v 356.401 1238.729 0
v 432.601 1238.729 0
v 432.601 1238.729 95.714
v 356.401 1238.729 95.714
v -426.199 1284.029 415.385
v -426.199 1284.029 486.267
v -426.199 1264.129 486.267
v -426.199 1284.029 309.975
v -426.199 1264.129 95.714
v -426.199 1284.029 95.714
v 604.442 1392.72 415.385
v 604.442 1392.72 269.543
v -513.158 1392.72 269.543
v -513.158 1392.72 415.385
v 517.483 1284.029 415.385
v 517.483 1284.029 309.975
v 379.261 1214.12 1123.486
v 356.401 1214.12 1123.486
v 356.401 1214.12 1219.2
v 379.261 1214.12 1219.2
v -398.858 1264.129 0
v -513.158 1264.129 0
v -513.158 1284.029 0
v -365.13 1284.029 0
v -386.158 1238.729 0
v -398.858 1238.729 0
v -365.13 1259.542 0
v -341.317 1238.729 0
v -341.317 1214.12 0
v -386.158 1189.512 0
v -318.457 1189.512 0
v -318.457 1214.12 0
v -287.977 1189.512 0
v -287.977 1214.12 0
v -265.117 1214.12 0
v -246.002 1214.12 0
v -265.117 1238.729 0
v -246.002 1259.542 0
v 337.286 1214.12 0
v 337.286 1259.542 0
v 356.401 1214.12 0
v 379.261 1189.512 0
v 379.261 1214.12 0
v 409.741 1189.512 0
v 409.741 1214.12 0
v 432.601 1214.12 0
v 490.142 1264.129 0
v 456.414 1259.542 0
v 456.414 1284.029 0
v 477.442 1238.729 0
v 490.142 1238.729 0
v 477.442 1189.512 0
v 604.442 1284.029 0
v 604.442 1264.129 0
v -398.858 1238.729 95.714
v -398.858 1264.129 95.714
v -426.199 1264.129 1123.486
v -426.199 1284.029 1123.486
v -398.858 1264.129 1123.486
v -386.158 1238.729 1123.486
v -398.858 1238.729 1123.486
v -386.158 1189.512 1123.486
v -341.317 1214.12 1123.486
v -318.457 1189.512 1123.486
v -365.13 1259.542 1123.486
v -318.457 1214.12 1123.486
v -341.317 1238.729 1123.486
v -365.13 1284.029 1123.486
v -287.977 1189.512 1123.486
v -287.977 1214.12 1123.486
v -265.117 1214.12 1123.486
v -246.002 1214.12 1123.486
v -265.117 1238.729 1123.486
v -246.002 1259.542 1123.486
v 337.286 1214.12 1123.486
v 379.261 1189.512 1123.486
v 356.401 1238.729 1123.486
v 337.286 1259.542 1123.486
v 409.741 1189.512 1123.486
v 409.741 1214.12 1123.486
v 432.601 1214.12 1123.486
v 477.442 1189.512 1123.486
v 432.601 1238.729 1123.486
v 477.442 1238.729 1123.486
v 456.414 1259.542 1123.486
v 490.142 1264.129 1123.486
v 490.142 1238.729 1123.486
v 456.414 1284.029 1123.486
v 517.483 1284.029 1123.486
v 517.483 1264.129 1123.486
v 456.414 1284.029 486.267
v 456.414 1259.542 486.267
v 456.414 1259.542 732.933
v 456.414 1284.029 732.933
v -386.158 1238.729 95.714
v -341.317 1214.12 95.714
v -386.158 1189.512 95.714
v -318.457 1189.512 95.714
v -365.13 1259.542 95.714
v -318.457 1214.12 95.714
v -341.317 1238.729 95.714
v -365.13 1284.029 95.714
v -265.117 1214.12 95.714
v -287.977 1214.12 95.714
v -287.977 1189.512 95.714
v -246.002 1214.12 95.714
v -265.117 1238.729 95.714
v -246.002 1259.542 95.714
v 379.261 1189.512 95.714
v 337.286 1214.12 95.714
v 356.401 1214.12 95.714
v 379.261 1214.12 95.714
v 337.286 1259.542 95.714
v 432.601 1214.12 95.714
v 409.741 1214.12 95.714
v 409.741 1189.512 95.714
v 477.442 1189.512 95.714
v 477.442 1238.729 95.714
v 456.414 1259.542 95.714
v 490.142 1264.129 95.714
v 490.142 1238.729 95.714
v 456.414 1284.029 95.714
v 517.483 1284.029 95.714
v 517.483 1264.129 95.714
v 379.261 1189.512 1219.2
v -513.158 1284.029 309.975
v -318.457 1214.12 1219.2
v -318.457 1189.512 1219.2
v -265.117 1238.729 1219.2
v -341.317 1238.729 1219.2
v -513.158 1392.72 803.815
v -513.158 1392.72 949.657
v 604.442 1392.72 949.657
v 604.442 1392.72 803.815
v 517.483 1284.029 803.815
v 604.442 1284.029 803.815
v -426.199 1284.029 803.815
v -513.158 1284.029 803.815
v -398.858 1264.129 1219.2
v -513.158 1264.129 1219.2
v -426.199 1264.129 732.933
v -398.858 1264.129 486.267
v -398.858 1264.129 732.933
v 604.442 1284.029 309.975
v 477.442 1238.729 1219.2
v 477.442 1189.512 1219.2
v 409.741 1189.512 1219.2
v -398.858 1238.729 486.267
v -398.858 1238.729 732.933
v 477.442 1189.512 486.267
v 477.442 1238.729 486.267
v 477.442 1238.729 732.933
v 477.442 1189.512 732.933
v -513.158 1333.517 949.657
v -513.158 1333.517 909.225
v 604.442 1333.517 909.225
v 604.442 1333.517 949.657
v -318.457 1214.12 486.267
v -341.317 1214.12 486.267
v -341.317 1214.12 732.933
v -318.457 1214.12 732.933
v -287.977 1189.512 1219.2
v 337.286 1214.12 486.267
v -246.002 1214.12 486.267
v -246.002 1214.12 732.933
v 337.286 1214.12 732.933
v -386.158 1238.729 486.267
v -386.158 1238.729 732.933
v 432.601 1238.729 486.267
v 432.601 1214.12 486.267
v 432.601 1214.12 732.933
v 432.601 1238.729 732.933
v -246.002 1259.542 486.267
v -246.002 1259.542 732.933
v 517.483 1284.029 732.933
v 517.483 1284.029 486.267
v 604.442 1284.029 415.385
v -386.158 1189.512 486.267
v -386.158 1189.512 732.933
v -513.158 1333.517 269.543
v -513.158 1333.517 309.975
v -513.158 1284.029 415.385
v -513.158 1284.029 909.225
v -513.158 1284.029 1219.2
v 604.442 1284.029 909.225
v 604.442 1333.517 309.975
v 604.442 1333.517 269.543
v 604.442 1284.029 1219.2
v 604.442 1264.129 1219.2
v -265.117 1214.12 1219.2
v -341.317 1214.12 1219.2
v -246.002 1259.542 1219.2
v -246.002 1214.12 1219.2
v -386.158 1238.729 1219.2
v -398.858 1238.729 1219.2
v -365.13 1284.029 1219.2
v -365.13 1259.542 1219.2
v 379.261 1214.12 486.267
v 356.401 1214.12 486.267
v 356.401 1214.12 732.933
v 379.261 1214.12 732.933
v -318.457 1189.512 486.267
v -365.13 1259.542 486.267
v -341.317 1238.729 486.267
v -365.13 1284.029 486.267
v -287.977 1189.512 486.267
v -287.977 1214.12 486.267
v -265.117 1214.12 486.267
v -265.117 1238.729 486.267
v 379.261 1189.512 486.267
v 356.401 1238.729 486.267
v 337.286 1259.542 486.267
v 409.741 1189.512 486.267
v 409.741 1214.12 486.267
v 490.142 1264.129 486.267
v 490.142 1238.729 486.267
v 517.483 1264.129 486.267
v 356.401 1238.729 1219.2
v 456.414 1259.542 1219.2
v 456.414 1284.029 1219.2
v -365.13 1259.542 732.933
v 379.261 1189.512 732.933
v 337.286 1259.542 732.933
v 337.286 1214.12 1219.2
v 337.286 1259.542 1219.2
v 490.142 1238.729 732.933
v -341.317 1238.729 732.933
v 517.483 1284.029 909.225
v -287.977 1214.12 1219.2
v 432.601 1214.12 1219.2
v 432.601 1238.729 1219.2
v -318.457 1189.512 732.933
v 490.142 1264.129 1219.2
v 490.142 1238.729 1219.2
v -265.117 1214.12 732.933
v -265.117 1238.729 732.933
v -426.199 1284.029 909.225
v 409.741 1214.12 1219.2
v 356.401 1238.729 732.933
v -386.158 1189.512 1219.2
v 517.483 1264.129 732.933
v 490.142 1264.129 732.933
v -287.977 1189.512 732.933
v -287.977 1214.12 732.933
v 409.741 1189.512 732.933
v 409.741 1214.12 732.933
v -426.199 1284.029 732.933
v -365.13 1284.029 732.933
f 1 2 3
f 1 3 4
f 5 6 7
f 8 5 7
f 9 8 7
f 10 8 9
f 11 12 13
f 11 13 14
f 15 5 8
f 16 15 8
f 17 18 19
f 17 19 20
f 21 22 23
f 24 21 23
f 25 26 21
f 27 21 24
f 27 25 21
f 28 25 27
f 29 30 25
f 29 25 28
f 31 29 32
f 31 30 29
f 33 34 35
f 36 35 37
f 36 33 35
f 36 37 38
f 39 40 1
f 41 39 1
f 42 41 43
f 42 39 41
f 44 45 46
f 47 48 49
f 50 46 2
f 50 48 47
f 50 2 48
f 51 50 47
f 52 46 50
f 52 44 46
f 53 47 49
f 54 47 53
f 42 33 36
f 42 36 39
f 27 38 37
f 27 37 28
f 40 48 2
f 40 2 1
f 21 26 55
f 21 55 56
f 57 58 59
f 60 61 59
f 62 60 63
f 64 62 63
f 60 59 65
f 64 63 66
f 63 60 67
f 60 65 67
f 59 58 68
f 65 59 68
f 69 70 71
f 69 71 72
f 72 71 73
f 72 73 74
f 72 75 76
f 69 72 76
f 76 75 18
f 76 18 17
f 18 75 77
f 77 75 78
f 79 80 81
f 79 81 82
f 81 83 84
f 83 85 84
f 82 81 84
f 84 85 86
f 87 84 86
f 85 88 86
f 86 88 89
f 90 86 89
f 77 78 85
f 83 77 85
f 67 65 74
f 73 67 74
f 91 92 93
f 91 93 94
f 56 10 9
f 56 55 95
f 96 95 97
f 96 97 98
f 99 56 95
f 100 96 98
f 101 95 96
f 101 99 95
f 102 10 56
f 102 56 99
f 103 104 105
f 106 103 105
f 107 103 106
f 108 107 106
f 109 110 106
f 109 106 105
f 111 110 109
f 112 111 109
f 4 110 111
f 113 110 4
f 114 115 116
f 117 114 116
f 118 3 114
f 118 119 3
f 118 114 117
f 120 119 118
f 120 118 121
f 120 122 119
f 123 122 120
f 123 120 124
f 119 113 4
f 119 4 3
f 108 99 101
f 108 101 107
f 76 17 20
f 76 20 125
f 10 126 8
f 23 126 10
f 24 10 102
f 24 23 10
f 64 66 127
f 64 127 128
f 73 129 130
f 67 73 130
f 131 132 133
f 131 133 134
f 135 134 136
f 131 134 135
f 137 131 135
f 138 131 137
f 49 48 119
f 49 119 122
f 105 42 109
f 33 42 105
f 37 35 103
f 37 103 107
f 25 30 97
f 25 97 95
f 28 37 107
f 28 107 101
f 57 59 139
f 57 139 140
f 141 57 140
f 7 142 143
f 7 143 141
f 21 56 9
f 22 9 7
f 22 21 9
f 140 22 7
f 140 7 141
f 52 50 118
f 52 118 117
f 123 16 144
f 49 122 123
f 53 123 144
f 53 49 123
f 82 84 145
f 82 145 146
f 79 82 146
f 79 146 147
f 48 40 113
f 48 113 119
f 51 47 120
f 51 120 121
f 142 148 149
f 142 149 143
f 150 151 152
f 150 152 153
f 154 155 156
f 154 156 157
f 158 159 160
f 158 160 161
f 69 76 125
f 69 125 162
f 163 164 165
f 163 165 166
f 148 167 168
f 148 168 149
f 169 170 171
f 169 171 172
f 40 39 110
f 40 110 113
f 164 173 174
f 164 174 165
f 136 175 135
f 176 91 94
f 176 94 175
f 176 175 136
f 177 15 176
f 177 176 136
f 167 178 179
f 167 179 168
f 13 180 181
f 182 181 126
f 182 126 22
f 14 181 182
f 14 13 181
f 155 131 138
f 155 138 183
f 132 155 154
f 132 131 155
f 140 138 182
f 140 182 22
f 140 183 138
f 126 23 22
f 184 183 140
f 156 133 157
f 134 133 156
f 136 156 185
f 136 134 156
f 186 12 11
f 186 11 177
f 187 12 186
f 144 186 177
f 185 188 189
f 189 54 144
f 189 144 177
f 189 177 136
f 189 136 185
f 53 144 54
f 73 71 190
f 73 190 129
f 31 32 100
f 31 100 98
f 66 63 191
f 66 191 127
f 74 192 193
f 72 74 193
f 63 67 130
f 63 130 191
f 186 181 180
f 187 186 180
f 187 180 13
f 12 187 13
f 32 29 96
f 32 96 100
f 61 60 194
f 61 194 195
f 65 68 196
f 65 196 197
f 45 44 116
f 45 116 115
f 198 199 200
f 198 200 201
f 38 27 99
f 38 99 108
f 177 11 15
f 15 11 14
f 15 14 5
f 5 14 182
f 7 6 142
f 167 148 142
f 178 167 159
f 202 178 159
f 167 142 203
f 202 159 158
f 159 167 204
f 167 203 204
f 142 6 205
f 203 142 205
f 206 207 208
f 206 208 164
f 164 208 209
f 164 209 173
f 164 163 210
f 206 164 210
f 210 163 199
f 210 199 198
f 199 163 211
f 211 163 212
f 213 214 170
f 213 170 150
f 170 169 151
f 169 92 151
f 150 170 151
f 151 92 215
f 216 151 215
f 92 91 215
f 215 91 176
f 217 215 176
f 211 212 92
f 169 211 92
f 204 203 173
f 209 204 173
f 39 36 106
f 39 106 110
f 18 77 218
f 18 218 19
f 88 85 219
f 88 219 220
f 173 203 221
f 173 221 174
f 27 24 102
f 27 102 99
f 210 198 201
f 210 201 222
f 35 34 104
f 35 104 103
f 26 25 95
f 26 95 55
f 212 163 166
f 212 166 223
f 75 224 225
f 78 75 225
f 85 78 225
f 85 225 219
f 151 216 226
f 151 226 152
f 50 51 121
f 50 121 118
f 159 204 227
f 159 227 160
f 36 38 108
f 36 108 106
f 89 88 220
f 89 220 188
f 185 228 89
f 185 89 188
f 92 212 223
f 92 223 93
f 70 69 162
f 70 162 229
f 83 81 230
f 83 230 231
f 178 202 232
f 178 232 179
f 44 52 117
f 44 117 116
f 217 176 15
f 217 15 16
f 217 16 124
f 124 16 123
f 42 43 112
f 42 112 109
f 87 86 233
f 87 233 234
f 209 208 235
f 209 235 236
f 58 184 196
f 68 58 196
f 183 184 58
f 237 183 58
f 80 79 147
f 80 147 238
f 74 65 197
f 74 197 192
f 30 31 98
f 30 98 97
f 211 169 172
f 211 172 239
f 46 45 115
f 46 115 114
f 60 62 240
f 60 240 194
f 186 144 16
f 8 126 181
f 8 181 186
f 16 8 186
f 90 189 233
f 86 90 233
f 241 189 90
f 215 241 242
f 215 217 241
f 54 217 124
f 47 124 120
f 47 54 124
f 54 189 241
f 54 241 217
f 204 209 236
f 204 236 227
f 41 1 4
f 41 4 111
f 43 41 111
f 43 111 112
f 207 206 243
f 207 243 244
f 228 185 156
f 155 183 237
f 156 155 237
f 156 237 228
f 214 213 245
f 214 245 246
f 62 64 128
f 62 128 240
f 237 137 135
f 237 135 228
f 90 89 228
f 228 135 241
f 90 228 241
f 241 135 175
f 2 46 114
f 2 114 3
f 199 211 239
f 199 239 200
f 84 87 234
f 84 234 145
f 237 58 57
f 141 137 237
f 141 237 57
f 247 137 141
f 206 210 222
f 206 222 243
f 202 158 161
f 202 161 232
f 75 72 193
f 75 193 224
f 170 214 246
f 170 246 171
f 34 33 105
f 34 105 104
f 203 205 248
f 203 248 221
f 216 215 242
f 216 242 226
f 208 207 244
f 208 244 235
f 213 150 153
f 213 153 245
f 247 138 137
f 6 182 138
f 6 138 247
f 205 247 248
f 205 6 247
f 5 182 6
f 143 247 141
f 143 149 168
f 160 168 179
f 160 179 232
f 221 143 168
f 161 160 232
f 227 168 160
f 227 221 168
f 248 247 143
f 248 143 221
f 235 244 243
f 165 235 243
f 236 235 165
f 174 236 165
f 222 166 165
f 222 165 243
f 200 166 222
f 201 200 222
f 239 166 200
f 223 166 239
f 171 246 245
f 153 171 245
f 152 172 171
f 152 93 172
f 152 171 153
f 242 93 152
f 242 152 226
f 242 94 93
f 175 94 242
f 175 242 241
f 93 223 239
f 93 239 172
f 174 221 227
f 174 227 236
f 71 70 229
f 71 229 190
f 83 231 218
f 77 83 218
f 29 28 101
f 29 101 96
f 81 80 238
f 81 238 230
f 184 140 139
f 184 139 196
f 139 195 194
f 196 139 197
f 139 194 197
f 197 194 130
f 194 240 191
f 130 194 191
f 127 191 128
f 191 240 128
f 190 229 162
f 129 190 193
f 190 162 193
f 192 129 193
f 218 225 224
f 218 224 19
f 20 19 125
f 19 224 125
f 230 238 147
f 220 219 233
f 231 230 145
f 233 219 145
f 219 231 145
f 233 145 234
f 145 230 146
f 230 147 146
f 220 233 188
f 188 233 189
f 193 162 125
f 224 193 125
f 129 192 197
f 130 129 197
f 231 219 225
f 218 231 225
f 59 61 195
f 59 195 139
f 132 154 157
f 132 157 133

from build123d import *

# Parameters (mm, degrees)
EXTRUDE1_DEPTH = 1219.2
SKETCH2_W      = 943.681413061
SKETCH2_H      = 390.553297683
EXTRUDE2_DEPTH = 1365.086621936
EXTRUDE3_REACH = 2095.85


with BuildPart() as part:
    # Sketch1 → Extrude1 (new body)
    with BuildSketch(Plane(origin=(0, 0, 0), x_dir=(-1, 0, 0), z_dir=(0, 0, 1))):
        Polygon((-604.441999719, -1264.128861053), (-490.141999719, -1264.128861053), (-490.141999719, -1238.728861053), (-477.441999719, -1238.728861053), (-477.441999719, -1189.511943694), (-409.740815056, -1189.511943694), (-409.740815056, -1214.120402374), (-432.600815056, -1214.120402374), (-432.600815056, -1238.728861053), (-356.400815056, -1238.728861053), (-356.400815056, -1214.120402374), (-379.260815056, -1214.120402374), (-379.260815056, -1189.511943694), (287.976815619, -1189.511943694), (287.976815619, -1214.120402374), (265.116815619, -1214.120402374), (265.116815619, -1238.728861053), (341.316815619, -1238.728861053), (341.316815619, -1214.120402374), (318.456815619, -1214.120402374), (318.456815619, -1189.511943694), (386.158000281, -1189.511943694), (386.158000281, -1238.728861053), (398.858000281, -1238.728861053), (398.858000281, -1264.128861053), (513.158000281, -1264.128861053), (513.158000281, -1284.029355434), (365.129820759, -1284.029355434), (365.129820759, -1259.541912826), (246.001721585, -1259.541912826), (246.001721585, -1214.120402374), (-337.285721023, -1214.120402374), (-337.285721023, -1259.541912826), (-456.413820196, -1259.541912826), (-456.413820196, -1284.029355434), (-604.441999719, -1284.029355434), align=None)
    extrude(amount=EXTRUDE1_DEPTH)

    # Sketch2 → Extrude2 (cut, through all)
    with BuildSketch(Plane(origin=(0, 1284.029355434, 0), x_dir=(1, 0, 0), z_dir=(0, 1, 0))):
        with Locations((45.641999718, -290.990730837)):
            Rectangle(SKETCH2_W, SKETCH2_H)
        with Locations((45.641999718, -928.209269163)):
            Rectangle(SKETCH2_W, SKETCH2_H)
    extrude(amount=-EXTRUDE2_DEPTH, mode=Mode.SUBTRACT)

    # Extrude3: up to this face of the body (flat: up to its plane)
    extrude3_end = Plane(part.part.faces().sort_by_distance((604.441999719, 1274.079108244, 609.6))[0])
    # Sketch3 → Extrude3 (add, up to the picked face)
    with BuildSketch(Plane.ZY.offset(513.158000281), mode=Mode.PRIVATE) as extrude3_sk1:
        Polygon((309.974780867, 1284.029355434), (309.974780867, 1333.517105863), (269.543425995, 1333.517105863), (269.543425995, 1392.72016121), (415.385098923, 1392.72016121), (415.385098923, 1284.029355434), align=None)
    extrude3_tool1 = split(extrude(extrude3_sk1.sketch, amount=-EXTRUDE3_REACH, mode=Mode.PRIVATE), bisect_by=extrude3_end, keep=Keep.BOTH, mode=Mode.PRIVATE)
    # Sketch3 → Extrude3 (add, up to the picked face)
    with BuildSketch(Plane.ZY.offset(513.158000281), mode=Mode.PRIVATE) as extrude3_sk2:
        Polygon((803.814901077, 1284.029355434), (909.225219133, 1284.029355434), (909.225219133, 1333.517105863), (949.656574005, 1333.517105863), (949.656574005, 1392.72016121), (803.814901077, 1392.72016121), align=None)
    extrude3_tool2 = split(extrude(extrude3_sk2.sketch, amount=-EXTRUDE3_REACH, mode=Mode.PRIVATE), bisect_by=extrude3_end, keep=Keep.BOTH, mode=Mode.PRIVATE)
    add(extrude3_tool1.solids().sort_by(Axis((-513.158, 1342.650934, 350.077941), (1, 0, 0)))[0])
    add(extrude3_tool2.solids().sort_by(Axis((-513.158, 1342.650934, 869.122059), (1, 0, 0)))[0])


solid = part.part
